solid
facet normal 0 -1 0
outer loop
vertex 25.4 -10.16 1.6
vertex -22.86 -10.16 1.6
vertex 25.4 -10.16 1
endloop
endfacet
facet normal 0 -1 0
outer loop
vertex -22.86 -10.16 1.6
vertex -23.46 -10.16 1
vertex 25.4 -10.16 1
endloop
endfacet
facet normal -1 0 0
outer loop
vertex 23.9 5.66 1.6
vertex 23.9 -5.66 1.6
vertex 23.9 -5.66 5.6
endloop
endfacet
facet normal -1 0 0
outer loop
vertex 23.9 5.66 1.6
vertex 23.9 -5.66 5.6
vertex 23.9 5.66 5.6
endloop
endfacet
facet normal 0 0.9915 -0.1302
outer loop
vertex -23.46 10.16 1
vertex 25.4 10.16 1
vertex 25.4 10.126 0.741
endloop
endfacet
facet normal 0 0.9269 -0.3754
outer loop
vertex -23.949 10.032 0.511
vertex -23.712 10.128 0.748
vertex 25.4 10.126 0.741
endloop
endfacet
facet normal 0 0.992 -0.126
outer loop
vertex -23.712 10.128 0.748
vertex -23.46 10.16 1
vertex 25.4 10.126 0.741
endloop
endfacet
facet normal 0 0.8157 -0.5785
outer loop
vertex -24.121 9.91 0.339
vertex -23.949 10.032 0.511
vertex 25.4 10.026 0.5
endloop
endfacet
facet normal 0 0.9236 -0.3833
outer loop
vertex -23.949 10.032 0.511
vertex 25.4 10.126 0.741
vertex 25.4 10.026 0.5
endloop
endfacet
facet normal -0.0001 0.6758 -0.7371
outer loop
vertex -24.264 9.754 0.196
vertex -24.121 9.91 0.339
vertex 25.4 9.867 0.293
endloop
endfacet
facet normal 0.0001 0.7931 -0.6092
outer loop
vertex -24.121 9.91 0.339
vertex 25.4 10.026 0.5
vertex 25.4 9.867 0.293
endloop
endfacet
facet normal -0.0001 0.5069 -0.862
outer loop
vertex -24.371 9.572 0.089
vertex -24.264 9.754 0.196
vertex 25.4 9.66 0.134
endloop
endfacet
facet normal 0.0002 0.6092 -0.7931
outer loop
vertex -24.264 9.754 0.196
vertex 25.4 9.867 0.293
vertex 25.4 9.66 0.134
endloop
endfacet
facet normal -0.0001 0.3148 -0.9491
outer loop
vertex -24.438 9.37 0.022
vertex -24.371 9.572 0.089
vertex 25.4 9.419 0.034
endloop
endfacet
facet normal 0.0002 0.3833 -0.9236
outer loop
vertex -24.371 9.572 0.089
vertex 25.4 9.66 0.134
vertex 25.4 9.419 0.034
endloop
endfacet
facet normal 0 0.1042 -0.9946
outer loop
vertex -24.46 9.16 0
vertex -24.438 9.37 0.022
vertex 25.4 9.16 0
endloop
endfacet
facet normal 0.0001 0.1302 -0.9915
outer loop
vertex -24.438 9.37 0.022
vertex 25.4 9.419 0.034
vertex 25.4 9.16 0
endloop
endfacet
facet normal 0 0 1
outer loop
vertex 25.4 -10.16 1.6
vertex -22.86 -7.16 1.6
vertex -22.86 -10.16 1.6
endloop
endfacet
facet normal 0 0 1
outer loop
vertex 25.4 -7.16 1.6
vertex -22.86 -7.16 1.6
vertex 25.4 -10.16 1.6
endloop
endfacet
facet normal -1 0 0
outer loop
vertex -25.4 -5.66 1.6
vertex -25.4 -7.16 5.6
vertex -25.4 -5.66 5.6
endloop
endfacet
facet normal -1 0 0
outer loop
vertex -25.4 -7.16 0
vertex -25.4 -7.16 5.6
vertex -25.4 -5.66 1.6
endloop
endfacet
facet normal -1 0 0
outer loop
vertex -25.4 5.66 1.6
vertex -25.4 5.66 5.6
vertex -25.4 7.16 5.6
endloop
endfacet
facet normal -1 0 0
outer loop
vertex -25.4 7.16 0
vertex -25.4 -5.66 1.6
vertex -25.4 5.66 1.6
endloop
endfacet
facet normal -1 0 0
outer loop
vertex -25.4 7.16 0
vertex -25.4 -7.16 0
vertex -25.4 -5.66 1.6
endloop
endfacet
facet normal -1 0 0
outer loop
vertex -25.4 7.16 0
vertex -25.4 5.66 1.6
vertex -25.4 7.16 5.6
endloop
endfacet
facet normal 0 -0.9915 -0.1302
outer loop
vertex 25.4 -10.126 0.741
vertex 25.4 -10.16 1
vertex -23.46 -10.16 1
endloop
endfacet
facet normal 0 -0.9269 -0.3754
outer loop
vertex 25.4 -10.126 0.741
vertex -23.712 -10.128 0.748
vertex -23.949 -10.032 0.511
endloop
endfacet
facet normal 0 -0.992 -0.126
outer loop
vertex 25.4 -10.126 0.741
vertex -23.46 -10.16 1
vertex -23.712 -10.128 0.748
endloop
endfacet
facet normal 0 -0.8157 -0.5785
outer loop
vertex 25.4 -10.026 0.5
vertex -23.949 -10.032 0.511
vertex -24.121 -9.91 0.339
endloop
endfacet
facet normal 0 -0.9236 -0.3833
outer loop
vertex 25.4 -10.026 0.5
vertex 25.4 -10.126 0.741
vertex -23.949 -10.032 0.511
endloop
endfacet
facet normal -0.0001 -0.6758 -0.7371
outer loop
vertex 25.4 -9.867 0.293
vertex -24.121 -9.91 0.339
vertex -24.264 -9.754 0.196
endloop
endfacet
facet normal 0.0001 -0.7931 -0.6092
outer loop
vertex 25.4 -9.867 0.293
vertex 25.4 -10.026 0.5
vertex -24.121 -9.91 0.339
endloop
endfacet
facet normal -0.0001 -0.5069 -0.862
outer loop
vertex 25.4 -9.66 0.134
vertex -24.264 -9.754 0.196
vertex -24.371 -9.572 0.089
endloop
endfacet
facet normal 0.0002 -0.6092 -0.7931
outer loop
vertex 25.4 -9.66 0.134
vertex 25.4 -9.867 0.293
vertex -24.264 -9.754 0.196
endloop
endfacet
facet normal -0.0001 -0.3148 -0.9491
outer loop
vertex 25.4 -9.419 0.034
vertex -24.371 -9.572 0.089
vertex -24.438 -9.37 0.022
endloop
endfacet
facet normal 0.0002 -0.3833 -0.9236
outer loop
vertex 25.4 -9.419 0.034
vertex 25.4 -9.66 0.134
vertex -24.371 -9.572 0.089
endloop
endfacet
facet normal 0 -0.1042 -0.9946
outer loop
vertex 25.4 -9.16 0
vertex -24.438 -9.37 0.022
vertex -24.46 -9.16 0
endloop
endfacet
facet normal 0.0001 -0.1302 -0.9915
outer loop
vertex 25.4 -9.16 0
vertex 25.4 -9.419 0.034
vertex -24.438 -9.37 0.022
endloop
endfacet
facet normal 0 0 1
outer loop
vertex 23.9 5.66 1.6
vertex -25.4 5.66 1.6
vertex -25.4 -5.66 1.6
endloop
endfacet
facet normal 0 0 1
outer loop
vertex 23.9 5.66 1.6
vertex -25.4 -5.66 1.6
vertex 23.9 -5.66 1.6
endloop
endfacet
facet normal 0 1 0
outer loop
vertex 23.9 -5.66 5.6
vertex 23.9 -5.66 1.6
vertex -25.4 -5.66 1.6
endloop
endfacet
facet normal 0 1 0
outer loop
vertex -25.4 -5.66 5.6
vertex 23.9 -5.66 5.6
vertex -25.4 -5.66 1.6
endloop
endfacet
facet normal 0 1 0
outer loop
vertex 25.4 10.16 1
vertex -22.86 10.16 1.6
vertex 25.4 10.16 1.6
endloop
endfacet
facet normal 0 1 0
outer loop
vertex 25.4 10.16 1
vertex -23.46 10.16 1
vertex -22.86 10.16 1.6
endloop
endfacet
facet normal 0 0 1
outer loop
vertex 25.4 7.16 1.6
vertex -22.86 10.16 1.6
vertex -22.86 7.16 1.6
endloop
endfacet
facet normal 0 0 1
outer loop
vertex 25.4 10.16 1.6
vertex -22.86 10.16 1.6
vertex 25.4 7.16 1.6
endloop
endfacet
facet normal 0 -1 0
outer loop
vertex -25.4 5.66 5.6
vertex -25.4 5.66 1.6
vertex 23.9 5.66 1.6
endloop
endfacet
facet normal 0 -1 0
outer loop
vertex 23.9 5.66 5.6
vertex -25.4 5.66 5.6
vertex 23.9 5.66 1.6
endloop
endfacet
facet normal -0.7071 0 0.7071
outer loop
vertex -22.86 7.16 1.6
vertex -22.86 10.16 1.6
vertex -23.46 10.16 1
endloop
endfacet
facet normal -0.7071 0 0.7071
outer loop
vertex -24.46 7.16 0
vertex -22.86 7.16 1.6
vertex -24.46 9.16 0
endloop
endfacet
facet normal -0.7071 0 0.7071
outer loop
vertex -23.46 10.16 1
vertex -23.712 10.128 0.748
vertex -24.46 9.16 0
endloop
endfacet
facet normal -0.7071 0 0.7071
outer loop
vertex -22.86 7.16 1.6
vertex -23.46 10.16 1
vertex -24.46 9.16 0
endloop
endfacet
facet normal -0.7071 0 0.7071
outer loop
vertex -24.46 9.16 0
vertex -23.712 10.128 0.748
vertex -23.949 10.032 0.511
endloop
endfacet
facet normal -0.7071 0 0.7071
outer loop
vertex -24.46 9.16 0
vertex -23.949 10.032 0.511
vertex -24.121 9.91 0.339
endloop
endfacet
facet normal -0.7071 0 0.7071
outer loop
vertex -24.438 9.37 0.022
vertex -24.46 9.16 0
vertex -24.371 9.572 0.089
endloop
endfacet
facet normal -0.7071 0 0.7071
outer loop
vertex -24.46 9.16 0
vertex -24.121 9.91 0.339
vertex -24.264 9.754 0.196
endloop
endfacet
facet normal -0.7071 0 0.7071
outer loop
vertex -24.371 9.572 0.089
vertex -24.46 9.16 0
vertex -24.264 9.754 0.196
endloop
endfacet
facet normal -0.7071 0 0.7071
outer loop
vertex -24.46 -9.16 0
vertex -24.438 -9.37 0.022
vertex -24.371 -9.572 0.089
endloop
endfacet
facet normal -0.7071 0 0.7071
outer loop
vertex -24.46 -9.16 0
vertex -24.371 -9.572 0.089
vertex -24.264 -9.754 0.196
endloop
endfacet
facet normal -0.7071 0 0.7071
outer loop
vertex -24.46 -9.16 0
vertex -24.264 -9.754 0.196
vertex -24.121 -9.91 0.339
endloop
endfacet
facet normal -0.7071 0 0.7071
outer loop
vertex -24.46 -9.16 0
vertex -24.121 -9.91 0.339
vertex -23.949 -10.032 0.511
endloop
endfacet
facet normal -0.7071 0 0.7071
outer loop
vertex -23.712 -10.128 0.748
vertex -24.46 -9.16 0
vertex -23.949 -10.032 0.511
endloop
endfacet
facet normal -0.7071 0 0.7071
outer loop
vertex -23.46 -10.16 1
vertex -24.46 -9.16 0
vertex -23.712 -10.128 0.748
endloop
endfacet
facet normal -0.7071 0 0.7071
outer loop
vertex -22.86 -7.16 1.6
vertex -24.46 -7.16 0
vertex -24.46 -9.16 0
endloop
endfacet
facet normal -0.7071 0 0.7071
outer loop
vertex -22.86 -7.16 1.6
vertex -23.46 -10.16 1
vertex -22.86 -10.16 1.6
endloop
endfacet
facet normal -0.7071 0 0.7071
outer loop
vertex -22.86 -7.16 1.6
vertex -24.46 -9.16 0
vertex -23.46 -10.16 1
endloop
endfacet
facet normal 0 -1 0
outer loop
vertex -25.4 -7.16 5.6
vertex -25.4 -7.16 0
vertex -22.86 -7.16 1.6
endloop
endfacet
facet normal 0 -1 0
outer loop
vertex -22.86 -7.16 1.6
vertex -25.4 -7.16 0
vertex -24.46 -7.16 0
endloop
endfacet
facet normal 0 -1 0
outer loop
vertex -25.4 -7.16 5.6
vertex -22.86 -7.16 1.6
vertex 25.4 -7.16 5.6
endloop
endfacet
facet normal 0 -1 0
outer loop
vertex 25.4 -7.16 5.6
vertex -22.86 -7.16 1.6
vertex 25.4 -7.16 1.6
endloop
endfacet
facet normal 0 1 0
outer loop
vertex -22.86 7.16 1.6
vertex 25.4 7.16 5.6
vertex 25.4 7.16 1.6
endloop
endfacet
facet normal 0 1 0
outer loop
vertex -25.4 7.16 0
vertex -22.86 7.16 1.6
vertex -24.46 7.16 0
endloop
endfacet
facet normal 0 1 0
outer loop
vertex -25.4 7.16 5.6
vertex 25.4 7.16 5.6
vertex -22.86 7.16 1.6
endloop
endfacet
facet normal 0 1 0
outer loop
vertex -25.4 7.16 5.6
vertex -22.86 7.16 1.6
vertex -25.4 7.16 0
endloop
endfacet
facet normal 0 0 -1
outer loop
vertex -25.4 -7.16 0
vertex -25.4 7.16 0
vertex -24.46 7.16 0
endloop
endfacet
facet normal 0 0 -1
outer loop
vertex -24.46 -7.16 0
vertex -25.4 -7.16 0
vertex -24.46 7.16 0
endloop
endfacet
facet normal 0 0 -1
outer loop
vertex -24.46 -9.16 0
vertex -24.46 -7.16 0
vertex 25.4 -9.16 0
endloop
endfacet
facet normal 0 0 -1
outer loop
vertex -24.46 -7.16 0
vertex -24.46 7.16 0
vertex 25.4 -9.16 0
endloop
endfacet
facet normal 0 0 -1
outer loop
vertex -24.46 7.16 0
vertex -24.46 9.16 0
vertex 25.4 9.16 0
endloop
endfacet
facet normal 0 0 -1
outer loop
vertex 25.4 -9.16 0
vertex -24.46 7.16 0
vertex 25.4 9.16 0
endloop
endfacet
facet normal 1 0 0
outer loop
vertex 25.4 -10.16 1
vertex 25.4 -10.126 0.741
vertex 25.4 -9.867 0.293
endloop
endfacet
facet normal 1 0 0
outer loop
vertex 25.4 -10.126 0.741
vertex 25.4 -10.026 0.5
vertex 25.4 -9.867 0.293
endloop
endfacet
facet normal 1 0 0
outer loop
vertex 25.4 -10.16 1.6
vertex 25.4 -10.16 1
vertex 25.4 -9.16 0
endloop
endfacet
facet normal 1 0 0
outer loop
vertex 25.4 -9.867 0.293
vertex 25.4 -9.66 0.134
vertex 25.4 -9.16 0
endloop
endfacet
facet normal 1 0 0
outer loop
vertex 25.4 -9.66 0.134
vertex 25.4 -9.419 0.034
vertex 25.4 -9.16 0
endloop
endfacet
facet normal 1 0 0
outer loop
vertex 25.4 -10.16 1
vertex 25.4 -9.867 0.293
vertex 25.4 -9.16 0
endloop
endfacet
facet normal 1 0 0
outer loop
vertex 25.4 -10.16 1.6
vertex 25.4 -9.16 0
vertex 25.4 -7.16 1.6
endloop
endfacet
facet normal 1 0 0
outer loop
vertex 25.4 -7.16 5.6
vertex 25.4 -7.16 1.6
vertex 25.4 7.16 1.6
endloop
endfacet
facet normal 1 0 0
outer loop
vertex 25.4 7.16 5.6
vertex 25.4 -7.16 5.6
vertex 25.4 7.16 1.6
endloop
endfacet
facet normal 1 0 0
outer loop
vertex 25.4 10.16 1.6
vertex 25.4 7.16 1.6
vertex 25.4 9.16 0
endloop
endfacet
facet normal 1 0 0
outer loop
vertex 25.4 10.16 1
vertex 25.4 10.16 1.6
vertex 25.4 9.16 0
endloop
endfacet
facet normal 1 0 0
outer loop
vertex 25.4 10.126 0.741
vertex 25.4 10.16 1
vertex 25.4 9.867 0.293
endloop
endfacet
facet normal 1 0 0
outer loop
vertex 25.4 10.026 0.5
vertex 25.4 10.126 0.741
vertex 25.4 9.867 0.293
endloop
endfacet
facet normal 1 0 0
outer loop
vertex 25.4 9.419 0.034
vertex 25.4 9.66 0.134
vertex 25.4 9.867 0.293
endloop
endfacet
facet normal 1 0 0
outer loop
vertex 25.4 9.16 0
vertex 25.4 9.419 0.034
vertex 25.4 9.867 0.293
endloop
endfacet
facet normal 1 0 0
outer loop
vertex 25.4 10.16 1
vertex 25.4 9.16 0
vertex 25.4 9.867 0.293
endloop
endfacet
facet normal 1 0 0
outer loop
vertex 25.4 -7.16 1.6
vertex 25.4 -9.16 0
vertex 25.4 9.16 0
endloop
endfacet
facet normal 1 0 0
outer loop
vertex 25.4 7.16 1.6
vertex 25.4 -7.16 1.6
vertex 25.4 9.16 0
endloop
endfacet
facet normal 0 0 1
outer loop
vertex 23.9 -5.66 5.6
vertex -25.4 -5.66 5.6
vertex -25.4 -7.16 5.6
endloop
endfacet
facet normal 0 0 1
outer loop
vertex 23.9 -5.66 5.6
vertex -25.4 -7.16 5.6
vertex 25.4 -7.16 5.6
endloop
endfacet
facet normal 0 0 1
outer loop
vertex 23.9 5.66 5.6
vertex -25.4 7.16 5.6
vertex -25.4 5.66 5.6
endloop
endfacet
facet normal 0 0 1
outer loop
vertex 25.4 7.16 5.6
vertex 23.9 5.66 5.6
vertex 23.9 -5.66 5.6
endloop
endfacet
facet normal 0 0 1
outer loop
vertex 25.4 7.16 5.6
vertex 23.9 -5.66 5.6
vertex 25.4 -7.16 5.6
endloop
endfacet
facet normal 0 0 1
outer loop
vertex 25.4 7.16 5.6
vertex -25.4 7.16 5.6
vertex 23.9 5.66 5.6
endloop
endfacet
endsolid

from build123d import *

# Parameters (mm, degrees)
F0_W        = 50.8
F0_H        = 20.32
F1_DEPTH    = 1.6
F2_W        = 1.5
F2_H        = 11.32
F3_DEPTH    = 4
F4_R        = 1
F5_T1_DEPTH = 9.5320747894
F5_T3_DEPTH = 9.5320747894


# Not quite as in the source:
# - a fillet or chamfer that OpenCascade refuses, or shapes differently, is made with other operations: its cross-section is extruded or revolved along the edge and cut away or added


with BuildPart() as f1:
    # F0 (on Top) → F1 (new body)
    with BuildSketch(Plane.XY):
        Rectangle(F0_W, F0_H)
    extrude(amount=F1_DEPTH)

    # F2 (on face) → F3 (join)
    with BuildSketch(Plane.XY.offset(1.6)):
        Polygon((25.4, 7.16), (-25.4, 7.16), (-25.4, 5.66), (23.9, 5.66), (25.4, 5.66), align=None)
        with Locations((24.65, 0)):
            Rectangle(F2_W, F2_H)
        Polygon((25.4, -7.16), (25.4, -5.66), (23.9, -5.66), (-25.4, -5.66), (-25.4, -7.16), align=None)
    extrude(amount=F3_DEPTH)

    # F4
    f4_edges = [f1.edges().sort_by_distance(p)[0] for p in [
        (0, -10.16, 0),
        (0, 10.16, 0),
    ]]
    fillet(f4_edges, radius=F4_R)

    # F5: chamfer of 2.54 on 2 edges, made by hand

    # F5_s2 → F5_t1 (cut)
    with BuildSketch(Plane.XZ.offset(-16.6920747894)):
        Polygon((-22.86, 1.6), (-25.4, -0.94), (-25.4, 1.6), align=None)
    extrude(amount=F5_T1_DEPTH, mode=Mode.SUBTRACT)

    # F5_s4 → F5_t3 (cut)
    with BuildSketch(Plane.XZ.offset(7.16)):
        Polygon((-25.4, -0.94), (-22.86, 1.6), (-25.4, 1.6), align=None)
    extrude(amount=F5_T3_DEPTH, mode=Mode.SUBTRACT)


solid = f1.part
